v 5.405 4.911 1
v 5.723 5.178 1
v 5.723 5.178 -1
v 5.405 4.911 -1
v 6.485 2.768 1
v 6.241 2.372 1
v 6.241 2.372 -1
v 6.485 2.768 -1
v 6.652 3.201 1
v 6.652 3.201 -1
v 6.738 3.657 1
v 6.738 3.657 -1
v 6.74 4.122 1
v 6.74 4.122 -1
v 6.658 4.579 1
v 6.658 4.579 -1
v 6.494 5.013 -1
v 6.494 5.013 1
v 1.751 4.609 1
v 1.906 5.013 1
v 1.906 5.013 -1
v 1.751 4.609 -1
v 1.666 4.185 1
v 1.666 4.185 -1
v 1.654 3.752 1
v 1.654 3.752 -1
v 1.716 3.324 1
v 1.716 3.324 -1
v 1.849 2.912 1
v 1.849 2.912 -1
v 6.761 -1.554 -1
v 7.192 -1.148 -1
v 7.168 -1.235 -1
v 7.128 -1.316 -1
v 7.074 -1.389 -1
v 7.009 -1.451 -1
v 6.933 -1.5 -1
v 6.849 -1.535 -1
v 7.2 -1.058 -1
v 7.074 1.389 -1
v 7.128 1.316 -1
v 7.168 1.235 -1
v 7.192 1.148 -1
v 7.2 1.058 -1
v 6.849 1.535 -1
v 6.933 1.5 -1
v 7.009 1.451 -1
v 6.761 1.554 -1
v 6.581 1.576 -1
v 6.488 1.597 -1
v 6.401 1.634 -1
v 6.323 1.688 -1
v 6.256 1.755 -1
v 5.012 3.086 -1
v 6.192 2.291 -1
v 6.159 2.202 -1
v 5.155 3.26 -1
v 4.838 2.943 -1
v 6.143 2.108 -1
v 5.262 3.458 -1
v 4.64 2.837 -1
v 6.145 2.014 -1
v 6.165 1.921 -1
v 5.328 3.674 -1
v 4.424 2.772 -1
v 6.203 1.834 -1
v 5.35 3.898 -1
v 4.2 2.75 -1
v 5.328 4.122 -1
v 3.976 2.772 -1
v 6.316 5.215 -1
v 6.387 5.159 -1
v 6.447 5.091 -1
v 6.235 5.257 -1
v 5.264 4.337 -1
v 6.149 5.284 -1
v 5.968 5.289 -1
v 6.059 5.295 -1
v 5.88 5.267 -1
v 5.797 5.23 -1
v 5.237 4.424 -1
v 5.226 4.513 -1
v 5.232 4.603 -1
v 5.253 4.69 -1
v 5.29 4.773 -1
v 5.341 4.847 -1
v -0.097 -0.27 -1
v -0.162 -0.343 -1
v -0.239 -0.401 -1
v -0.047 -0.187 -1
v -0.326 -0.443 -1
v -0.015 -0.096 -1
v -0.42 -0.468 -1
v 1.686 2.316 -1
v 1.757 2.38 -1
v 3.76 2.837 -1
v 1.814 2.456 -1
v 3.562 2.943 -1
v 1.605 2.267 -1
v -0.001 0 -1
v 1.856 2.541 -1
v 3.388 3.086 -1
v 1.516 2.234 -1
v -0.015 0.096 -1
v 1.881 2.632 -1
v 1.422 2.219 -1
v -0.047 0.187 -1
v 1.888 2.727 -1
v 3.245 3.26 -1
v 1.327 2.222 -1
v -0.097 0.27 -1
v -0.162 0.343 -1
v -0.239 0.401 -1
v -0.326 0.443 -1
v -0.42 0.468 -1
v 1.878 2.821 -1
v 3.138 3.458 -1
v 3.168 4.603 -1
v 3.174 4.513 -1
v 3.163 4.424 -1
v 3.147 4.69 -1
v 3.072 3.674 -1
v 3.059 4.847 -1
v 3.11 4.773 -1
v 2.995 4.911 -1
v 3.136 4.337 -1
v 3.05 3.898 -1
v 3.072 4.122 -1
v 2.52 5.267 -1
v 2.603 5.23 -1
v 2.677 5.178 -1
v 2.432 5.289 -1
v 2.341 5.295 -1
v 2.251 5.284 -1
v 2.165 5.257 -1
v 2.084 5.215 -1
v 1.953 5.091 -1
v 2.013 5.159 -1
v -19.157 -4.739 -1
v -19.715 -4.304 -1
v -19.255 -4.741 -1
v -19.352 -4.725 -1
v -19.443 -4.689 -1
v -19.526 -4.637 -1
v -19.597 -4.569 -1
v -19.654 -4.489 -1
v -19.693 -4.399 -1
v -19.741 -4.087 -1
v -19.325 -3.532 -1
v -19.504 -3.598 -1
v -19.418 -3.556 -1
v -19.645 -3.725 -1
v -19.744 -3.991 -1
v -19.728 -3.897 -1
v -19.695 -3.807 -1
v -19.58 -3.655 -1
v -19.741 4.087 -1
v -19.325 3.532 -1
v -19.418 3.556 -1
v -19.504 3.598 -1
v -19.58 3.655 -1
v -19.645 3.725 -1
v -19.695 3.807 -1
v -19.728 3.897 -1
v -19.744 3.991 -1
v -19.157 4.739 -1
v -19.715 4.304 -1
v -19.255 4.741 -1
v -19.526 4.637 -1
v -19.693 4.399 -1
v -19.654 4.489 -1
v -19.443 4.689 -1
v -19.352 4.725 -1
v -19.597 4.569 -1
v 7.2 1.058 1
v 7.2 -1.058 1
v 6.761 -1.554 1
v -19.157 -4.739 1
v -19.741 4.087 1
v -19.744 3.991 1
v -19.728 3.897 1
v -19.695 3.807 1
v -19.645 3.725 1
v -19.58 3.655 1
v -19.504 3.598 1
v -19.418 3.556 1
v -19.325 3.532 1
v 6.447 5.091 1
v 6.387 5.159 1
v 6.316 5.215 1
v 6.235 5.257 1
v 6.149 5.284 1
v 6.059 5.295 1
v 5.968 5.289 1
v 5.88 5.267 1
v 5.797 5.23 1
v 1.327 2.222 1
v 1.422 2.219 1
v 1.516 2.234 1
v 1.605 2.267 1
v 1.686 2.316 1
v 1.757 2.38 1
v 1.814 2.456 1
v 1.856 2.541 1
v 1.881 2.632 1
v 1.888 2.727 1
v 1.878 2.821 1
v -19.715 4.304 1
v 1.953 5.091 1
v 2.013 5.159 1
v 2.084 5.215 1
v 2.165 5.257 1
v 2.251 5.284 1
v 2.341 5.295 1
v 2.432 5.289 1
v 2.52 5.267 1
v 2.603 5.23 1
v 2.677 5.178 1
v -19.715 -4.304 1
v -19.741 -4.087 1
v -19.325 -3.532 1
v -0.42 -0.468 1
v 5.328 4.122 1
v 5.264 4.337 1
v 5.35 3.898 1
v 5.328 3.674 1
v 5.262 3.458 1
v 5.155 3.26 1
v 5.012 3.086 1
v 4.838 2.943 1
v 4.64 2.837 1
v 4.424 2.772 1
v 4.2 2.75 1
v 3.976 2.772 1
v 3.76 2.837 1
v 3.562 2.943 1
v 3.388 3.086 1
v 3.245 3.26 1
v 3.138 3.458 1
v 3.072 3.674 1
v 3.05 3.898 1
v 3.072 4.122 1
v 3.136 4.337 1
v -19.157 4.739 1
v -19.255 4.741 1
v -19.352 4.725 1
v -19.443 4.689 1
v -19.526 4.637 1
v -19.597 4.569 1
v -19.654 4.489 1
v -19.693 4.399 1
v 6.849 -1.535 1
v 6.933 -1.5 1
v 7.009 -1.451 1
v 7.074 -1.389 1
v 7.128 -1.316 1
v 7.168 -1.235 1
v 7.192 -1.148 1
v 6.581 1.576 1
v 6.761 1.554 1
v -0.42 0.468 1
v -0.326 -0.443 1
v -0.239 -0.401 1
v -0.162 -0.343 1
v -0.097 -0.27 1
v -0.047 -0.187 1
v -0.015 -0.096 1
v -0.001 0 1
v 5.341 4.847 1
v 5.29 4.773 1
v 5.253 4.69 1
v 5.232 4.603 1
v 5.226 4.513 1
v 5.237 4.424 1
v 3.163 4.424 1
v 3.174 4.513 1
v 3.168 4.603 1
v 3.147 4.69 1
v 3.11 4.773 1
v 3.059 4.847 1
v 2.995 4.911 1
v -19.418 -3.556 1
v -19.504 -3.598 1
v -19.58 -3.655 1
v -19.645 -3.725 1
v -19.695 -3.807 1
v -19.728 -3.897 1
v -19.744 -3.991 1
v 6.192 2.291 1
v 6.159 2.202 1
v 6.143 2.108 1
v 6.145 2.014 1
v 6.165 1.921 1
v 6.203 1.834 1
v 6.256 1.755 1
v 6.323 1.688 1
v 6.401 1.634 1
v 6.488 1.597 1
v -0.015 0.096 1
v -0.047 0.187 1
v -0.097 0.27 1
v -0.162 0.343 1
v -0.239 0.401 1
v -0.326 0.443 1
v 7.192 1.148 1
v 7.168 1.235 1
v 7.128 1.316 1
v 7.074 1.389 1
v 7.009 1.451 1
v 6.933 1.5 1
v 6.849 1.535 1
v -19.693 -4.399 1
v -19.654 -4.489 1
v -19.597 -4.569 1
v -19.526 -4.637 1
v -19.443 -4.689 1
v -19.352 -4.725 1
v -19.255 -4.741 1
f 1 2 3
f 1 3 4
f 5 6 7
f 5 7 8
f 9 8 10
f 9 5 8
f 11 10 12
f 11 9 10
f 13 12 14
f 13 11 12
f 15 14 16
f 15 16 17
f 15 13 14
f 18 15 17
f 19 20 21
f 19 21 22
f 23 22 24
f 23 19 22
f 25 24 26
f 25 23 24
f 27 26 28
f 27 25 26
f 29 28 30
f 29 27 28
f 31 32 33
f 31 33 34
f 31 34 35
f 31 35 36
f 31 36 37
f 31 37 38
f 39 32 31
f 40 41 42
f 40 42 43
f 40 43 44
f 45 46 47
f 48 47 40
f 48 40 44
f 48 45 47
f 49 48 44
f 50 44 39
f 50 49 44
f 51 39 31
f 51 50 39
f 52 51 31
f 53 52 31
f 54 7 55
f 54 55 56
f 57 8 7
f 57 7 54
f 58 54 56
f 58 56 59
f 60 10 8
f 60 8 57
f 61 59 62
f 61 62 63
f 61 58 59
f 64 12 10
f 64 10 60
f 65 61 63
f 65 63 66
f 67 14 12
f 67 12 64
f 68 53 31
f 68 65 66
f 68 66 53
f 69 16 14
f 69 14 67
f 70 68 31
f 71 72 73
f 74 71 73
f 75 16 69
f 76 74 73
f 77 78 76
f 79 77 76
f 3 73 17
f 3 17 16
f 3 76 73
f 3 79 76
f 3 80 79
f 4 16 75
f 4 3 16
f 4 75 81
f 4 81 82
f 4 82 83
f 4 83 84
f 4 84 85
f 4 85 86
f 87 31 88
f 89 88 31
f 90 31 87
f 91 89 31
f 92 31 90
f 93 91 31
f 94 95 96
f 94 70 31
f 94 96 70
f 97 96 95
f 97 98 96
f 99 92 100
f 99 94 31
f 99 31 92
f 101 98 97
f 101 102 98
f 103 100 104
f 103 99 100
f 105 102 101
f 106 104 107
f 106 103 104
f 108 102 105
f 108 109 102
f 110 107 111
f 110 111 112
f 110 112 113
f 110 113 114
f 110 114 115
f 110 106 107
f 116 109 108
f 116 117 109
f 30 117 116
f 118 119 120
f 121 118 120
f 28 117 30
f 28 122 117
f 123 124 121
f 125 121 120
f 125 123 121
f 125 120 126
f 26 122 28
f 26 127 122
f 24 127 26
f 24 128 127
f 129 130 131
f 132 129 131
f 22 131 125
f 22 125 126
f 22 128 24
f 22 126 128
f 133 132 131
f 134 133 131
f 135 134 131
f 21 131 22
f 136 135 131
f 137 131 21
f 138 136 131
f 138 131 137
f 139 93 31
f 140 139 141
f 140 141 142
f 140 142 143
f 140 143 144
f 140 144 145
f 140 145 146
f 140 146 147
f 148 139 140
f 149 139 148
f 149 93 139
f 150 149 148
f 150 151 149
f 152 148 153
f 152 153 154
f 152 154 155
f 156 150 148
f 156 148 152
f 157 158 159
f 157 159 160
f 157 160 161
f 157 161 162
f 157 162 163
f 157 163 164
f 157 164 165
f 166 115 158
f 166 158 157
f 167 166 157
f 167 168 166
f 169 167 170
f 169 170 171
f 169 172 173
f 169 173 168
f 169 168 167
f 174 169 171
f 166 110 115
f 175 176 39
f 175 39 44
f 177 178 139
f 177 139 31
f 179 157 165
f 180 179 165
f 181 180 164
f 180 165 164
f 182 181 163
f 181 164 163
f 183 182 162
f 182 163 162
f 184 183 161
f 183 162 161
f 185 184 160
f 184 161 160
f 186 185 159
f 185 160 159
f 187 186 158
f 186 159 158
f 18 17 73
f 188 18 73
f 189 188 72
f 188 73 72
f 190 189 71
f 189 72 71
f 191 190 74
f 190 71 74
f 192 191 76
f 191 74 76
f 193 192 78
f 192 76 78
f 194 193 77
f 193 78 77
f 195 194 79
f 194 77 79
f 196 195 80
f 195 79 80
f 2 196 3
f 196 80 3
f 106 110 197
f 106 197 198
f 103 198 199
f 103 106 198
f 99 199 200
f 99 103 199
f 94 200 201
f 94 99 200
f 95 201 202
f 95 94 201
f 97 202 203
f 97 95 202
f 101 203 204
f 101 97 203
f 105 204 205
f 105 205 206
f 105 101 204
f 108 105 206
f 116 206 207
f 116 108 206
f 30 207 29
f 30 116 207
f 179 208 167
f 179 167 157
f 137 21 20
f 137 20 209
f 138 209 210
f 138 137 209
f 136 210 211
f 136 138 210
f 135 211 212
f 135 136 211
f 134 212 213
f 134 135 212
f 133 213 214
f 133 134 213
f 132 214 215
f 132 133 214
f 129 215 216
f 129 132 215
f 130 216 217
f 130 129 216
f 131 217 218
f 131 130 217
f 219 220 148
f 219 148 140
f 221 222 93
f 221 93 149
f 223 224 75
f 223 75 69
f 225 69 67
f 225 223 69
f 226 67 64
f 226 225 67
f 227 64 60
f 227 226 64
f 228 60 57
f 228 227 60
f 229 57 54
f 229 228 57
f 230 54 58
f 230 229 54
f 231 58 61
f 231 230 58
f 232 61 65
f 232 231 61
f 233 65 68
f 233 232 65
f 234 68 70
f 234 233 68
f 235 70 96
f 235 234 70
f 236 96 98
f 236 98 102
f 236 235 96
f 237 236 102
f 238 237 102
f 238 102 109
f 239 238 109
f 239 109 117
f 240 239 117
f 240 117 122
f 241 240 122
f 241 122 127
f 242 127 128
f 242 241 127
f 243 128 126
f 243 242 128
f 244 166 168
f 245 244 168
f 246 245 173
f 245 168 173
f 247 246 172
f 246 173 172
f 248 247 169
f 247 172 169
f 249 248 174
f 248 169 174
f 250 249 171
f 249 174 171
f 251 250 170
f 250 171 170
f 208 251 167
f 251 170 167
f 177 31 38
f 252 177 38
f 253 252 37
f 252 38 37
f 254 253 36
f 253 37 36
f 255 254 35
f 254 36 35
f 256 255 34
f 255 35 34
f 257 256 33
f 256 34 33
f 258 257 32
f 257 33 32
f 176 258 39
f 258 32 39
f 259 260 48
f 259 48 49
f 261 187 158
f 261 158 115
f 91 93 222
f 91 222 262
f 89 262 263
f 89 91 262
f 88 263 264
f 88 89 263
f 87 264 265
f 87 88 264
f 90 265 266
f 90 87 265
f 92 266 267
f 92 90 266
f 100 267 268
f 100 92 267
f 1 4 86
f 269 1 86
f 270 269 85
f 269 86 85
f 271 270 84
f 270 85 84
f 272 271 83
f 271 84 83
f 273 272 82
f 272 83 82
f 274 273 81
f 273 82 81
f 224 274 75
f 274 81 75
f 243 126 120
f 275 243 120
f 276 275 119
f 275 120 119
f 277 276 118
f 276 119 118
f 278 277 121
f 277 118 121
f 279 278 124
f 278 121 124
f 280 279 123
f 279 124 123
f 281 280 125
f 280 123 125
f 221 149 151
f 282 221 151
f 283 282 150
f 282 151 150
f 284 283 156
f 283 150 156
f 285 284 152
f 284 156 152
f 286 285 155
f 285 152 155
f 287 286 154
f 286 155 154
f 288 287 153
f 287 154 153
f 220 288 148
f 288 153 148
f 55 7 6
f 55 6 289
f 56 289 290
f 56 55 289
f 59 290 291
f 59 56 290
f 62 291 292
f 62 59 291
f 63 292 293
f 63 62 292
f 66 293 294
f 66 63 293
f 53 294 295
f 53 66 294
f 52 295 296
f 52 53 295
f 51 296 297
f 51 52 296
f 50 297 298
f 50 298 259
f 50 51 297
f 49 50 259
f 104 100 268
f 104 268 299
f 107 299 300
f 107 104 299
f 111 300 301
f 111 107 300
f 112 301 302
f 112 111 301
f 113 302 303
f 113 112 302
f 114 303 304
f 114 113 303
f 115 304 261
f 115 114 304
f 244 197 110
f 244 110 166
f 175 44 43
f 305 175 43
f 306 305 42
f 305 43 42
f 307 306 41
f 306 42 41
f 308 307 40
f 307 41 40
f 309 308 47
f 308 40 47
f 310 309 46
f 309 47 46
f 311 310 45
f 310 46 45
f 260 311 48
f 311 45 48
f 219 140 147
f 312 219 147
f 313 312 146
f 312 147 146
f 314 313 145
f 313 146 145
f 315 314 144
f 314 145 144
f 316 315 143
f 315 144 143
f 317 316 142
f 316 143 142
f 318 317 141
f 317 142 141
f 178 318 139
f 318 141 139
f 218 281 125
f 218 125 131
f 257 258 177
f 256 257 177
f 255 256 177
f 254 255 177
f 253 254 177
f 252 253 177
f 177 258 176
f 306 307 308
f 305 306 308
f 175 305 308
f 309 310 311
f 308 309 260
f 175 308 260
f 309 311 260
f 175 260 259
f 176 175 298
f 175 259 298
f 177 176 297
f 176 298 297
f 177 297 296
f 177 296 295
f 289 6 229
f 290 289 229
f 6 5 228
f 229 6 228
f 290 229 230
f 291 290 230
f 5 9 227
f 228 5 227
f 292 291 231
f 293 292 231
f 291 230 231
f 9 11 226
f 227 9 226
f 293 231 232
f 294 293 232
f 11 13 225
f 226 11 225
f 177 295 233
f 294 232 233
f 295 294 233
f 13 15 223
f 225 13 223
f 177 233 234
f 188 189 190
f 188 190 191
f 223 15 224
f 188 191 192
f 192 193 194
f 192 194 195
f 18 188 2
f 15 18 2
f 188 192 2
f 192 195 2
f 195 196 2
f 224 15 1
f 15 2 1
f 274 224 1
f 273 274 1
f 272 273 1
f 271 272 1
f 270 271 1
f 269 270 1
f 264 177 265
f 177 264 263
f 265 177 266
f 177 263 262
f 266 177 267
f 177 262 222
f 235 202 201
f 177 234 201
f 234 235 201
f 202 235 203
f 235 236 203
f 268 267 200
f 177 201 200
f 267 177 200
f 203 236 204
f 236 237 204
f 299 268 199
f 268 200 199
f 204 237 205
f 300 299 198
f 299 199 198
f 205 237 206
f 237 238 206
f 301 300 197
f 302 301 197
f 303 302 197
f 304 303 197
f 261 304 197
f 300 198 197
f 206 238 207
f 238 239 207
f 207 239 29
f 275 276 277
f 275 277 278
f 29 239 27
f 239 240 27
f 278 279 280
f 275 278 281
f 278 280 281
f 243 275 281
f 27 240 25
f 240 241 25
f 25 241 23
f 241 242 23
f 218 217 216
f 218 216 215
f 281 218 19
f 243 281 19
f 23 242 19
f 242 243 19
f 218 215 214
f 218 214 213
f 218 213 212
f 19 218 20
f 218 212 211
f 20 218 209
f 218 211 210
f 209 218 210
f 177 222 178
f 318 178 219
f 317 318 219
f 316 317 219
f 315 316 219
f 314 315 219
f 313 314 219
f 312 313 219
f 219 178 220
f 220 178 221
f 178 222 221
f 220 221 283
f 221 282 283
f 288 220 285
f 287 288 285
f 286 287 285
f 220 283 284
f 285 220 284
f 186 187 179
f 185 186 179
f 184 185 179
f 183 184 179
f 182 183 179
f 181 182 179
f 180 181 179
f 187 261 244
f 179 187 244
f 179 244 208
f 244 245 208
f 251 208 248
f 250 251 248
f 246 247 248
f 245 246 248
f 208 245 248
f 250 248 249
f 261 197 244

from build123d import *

# Parameters (mm, degrees)
F1_DEPTH     = 1
F2_T1_DEPTH  = 2
F2_T3_DEPTH  = 4.1120925968
F2_T5_DEPTH  = 5.1335042229
F2_T7_DEPTH  = 4.211585233
F2_T9_DEPTH  = 4.4058060179
F2_T11_DEPTH = 4.5


# Not quite as in the source:
# - a fillet or chamfer that OpenCascade refuses, or shapes differently, is made with other operations: its cross-section is extruded or revolved along the edge and cut away or added


with BuildPart() as f1:
    # F0 (on Top) → F1 (new body, symmetric)
    with BuildSketch(Plane.XY):
        with BuildLine():
            Line((-19.8, -3.608959583), (-19.6536349592, -4.8))
            Line((-19.6536349592, -4.8), (7.2, -1.5))
            Line((7.2, -1.5), (7.2, 1.5))
            Line((7.2, 1.5), (5.5036997956, 1.7084556032))
            ThreePointArc((5.5036997956, 1.7084556032), (6.7140946083, 3.4735867022), (6.15341333, 5.5391084047))
            Line((6.15341333, 5.5391084047), (5.0809511096, 4.6392057511))
            ThreePointArc((5.0809511096, 4.6392057511), (4.2, 2.75), (3.3190488904, 4.6392057511))
            Line((3.3190488904, 4.6392057511), (2.24658667, 5.5391084047))
            ThreePointArc((2.24658667, 5.5391084047), (1.6526664248, 3.7834167399), (2.4044726286, 2.089314644))
            Line((2.4044726286, 2.089314644), (-19.6536349592, 4.8))
            Line((-19.6536349592, 4.8), (-19.8, 3.608959583))
            Line((-19.8, 3.608959583), (0, 0.4))
            Line((0, 0.4), (0, -0.4))
            Line((0, -0.4), (-19.8, -3.608959583))
        make_face()
    extrude(amount=F1_DEPTH, both=True)

    # F2: fillet of radius 0.5 on 14 edges, made by hand

    # F2_s2 → F2_t1 (join)
    with BuildSketch(Plane.XY.offset(-1)):
        with BuildLine():
            ThreePointArc((-0.4200093847, -0.4680703606), (-0.1192144254, -0.2985509875), (0, 0.0254896676))
            Line((0, 0.0254896676), (0, -0.4))
            Line((0, -0.4), (-0.4200093847, -0.4680703606))
        make_face()
        with BuildLine():
            ThreePointArc((0, -0.0254896676), (-0.1192144254, 0.2985509875), (-0.4200093847, 0.4680703606))
            Line((-0.4200093847, 0.4680703606), (0, 0.4))
            Line((0, 0.4), (0, -0.0254896676))
        make_face()
        with BuildLine():
            ThreePointArc((6.2414791759, 2.3719742233), (6.1818236662, 1.8762743647), (6.5807837768, 1.5760944855))
            Line((6.5807837768, 1.5760944855), (5.5036997956, 1.7084556032))
            ThreePointArc((5.5036997956, 1.7084556032), (5.9051744273, 2.003983077), (6.2414791759, 2.3719742233))
        make_face()
        with BuildLine():
            ThreePointArc((1.3273886474, 2.2216757617), (1.7871578534, 2.4163277766), (1.8492963629, 2.9117225034))
            ThreePointArc((1.8492963629, 2.9117225034), (2.0864966132, 2.4732542504), (2.4044726286, 2.089314644))
            Line((2.4044726286, 2.089314644), (1.3273886474, 2.2216757617))
        make_face()
    extrude(amount=F2_T1_DEPTH)

    # F2_s4 → F2_t3 (cut)
    with BuildSketch(Plane.XY.offset(-2.0560462984)):
        with BuildLine():
            ThreePointArc((3.1364686576, 4.3374940957), (3.1595895158, 4.6471438712), (2.995457531, 4.9107311415))
            Line((2.995457531, 4.9107311415), (3.3190488904, 4.6392057511))
            ThreePointArc((3.3190488904, 4.6392057511), (3.2161247629, 4.4953902231), (3.1364686576, 4.3374940957))
        make_face()
        with BuildLine():
            ThreePointArc((5.404542469, 4.9107311415), (5.2404104842, 4.6471438712), (5.2635313424, 4.3374940957))
            ThreePointArc((5.2635313424, 4.3374940957), (5.1838752371, 4.4953902231), (5.0809511096, 4.6392057511))
            Line((5.0809511096, 4.6392057511), (5.404542469, 4.9107311415))
        make_face()
    extrude(amount=F2_T3_DEPTH, mode=Mode.SUBTRACT)

    # F2_s6 → F2_t5 (cut)
    with BuildSketch(Plane.XY.offset(-2.5667521115)):
        with BuildLine():
            ThreePointArc((1.9057976578, 5.0131646836), (2.2511861931, 5.283864521), (2.6770350591, 5.1779193202))
            Line((2.6770350591, 5.1779193202), (2.24658667, 5.5391084047))
            ThreePointArc((2.24658667, 5.5391084047), (2.0599733824, 5.2866456202), (1.9057976578, 5.0131646836))
        make_face()
        with BuildLine():
            ThreePointArc((6.4942023422, 5.0131646836), (6.1488138069, 5.283864521), (5.7229649409, 5.1779193202))
            Line((5.7229649409, 5.1779193202), (6.15341333, 5.5391084047))
            ThreePointArc((6.15341333, 5.5391084047), (6.3400266176, 5.2866456202), (6.4942023422, 5.0131646836))
        make_face()
    extrude(amount=F2_T5_DEPTH, mode=Mode.SUBTRACT)

    # F2_s8 → F2_t7 (cut)
    with BuildSketch(Plane.XY.offset(-2.1057926165)):
        with BuildLine():
            ThreePointArc((7.2, 1.0576829534), (7.0744948043, 1.388973825), (6.7609854337, 1.5539497938))
            Line((6.7609854337, 1.5539497938), (7.2, 1.5))
            Line((7.2, 1.5), (7.2, 1.0576829534))
        make_face()
        with BuildLine():
            ThreePointArc((6.7609854337, -1.5539497938), (7.0744948043, -1.388973825), (7.2, -1.0576829534))
            Line((7.2, -1.0576829534), (7.2, -1.5))
            Line((7.2, -1.5), (6.7609854337, -1.5539497938))
        make_face()
    extrude(amount=F2_T7_DEPTH, mode=Mode.SUBTRACT)

    # F2_s10 → F2_t9 (cut)
    with BuildSketch(Plane.XY.offset(-2.202903009)):
        with BuildLine():
            ThreePointArc((-19.3250361256, -3.5319828216), (-19.644918404, -3.7253734495), (-19.7413123507, -4.0865282835))
            Line((-19.7413123507, -4.0865282835), (-19.8, -3.608959583))
            Line((-19.8, -3.608959583), (-19.3250361256, -3.5319828216))
        make_face()
        with BuildLine():
            ThreePointArc((-19.7413123507, 4.0865282835), (-19.644918404, 3.7253734495), (-19.3250361256, 3.5319828216))
            Line((-19.3250361256, 3.5319828216), (-19.8, 3.608959583))
            Line((-19.8, 3.608959583), (-19.7413123507, 4.0865282835))
        make_face()
    extrude(amount=F2_T9_DEPTH, mode=Mode.SUBTRACT)

    # F2_s12 → F2_t11 (cut)
    with BuildSketch(Plane.XY.offset(-2.25)):
        with BuildLine():
            ThreePointArc((-19.7146203929, -4.3037331596), (-19.5261439869, -4.6367845878), (-19.1573681188, -4.7390145663))
            Line((-19.1573681188, -4.7390145663), (-19.6536349592, -4.8))
            Line((-19.6536349592, -4.8), (-19.7146203929, -4.3037331596))
        make_face()
        with BuildLine():
            ThreePointArc((-19.1573681188, 4.7390145663), (-19.5261439869, 4.6367845878), (-19.7146203929, 4.3037331596))
            Line((-19.7146203929, 4.3037331596), (-19.6536349592, 4.8))
            Line((-19.6536349592, 4.8), (-19.1573681188, 4.7390145663))
        make_face()
    extrude(amount=F2_T11_DEPTH, mode=Mode.SUBTRACT)


solid = f1.part
